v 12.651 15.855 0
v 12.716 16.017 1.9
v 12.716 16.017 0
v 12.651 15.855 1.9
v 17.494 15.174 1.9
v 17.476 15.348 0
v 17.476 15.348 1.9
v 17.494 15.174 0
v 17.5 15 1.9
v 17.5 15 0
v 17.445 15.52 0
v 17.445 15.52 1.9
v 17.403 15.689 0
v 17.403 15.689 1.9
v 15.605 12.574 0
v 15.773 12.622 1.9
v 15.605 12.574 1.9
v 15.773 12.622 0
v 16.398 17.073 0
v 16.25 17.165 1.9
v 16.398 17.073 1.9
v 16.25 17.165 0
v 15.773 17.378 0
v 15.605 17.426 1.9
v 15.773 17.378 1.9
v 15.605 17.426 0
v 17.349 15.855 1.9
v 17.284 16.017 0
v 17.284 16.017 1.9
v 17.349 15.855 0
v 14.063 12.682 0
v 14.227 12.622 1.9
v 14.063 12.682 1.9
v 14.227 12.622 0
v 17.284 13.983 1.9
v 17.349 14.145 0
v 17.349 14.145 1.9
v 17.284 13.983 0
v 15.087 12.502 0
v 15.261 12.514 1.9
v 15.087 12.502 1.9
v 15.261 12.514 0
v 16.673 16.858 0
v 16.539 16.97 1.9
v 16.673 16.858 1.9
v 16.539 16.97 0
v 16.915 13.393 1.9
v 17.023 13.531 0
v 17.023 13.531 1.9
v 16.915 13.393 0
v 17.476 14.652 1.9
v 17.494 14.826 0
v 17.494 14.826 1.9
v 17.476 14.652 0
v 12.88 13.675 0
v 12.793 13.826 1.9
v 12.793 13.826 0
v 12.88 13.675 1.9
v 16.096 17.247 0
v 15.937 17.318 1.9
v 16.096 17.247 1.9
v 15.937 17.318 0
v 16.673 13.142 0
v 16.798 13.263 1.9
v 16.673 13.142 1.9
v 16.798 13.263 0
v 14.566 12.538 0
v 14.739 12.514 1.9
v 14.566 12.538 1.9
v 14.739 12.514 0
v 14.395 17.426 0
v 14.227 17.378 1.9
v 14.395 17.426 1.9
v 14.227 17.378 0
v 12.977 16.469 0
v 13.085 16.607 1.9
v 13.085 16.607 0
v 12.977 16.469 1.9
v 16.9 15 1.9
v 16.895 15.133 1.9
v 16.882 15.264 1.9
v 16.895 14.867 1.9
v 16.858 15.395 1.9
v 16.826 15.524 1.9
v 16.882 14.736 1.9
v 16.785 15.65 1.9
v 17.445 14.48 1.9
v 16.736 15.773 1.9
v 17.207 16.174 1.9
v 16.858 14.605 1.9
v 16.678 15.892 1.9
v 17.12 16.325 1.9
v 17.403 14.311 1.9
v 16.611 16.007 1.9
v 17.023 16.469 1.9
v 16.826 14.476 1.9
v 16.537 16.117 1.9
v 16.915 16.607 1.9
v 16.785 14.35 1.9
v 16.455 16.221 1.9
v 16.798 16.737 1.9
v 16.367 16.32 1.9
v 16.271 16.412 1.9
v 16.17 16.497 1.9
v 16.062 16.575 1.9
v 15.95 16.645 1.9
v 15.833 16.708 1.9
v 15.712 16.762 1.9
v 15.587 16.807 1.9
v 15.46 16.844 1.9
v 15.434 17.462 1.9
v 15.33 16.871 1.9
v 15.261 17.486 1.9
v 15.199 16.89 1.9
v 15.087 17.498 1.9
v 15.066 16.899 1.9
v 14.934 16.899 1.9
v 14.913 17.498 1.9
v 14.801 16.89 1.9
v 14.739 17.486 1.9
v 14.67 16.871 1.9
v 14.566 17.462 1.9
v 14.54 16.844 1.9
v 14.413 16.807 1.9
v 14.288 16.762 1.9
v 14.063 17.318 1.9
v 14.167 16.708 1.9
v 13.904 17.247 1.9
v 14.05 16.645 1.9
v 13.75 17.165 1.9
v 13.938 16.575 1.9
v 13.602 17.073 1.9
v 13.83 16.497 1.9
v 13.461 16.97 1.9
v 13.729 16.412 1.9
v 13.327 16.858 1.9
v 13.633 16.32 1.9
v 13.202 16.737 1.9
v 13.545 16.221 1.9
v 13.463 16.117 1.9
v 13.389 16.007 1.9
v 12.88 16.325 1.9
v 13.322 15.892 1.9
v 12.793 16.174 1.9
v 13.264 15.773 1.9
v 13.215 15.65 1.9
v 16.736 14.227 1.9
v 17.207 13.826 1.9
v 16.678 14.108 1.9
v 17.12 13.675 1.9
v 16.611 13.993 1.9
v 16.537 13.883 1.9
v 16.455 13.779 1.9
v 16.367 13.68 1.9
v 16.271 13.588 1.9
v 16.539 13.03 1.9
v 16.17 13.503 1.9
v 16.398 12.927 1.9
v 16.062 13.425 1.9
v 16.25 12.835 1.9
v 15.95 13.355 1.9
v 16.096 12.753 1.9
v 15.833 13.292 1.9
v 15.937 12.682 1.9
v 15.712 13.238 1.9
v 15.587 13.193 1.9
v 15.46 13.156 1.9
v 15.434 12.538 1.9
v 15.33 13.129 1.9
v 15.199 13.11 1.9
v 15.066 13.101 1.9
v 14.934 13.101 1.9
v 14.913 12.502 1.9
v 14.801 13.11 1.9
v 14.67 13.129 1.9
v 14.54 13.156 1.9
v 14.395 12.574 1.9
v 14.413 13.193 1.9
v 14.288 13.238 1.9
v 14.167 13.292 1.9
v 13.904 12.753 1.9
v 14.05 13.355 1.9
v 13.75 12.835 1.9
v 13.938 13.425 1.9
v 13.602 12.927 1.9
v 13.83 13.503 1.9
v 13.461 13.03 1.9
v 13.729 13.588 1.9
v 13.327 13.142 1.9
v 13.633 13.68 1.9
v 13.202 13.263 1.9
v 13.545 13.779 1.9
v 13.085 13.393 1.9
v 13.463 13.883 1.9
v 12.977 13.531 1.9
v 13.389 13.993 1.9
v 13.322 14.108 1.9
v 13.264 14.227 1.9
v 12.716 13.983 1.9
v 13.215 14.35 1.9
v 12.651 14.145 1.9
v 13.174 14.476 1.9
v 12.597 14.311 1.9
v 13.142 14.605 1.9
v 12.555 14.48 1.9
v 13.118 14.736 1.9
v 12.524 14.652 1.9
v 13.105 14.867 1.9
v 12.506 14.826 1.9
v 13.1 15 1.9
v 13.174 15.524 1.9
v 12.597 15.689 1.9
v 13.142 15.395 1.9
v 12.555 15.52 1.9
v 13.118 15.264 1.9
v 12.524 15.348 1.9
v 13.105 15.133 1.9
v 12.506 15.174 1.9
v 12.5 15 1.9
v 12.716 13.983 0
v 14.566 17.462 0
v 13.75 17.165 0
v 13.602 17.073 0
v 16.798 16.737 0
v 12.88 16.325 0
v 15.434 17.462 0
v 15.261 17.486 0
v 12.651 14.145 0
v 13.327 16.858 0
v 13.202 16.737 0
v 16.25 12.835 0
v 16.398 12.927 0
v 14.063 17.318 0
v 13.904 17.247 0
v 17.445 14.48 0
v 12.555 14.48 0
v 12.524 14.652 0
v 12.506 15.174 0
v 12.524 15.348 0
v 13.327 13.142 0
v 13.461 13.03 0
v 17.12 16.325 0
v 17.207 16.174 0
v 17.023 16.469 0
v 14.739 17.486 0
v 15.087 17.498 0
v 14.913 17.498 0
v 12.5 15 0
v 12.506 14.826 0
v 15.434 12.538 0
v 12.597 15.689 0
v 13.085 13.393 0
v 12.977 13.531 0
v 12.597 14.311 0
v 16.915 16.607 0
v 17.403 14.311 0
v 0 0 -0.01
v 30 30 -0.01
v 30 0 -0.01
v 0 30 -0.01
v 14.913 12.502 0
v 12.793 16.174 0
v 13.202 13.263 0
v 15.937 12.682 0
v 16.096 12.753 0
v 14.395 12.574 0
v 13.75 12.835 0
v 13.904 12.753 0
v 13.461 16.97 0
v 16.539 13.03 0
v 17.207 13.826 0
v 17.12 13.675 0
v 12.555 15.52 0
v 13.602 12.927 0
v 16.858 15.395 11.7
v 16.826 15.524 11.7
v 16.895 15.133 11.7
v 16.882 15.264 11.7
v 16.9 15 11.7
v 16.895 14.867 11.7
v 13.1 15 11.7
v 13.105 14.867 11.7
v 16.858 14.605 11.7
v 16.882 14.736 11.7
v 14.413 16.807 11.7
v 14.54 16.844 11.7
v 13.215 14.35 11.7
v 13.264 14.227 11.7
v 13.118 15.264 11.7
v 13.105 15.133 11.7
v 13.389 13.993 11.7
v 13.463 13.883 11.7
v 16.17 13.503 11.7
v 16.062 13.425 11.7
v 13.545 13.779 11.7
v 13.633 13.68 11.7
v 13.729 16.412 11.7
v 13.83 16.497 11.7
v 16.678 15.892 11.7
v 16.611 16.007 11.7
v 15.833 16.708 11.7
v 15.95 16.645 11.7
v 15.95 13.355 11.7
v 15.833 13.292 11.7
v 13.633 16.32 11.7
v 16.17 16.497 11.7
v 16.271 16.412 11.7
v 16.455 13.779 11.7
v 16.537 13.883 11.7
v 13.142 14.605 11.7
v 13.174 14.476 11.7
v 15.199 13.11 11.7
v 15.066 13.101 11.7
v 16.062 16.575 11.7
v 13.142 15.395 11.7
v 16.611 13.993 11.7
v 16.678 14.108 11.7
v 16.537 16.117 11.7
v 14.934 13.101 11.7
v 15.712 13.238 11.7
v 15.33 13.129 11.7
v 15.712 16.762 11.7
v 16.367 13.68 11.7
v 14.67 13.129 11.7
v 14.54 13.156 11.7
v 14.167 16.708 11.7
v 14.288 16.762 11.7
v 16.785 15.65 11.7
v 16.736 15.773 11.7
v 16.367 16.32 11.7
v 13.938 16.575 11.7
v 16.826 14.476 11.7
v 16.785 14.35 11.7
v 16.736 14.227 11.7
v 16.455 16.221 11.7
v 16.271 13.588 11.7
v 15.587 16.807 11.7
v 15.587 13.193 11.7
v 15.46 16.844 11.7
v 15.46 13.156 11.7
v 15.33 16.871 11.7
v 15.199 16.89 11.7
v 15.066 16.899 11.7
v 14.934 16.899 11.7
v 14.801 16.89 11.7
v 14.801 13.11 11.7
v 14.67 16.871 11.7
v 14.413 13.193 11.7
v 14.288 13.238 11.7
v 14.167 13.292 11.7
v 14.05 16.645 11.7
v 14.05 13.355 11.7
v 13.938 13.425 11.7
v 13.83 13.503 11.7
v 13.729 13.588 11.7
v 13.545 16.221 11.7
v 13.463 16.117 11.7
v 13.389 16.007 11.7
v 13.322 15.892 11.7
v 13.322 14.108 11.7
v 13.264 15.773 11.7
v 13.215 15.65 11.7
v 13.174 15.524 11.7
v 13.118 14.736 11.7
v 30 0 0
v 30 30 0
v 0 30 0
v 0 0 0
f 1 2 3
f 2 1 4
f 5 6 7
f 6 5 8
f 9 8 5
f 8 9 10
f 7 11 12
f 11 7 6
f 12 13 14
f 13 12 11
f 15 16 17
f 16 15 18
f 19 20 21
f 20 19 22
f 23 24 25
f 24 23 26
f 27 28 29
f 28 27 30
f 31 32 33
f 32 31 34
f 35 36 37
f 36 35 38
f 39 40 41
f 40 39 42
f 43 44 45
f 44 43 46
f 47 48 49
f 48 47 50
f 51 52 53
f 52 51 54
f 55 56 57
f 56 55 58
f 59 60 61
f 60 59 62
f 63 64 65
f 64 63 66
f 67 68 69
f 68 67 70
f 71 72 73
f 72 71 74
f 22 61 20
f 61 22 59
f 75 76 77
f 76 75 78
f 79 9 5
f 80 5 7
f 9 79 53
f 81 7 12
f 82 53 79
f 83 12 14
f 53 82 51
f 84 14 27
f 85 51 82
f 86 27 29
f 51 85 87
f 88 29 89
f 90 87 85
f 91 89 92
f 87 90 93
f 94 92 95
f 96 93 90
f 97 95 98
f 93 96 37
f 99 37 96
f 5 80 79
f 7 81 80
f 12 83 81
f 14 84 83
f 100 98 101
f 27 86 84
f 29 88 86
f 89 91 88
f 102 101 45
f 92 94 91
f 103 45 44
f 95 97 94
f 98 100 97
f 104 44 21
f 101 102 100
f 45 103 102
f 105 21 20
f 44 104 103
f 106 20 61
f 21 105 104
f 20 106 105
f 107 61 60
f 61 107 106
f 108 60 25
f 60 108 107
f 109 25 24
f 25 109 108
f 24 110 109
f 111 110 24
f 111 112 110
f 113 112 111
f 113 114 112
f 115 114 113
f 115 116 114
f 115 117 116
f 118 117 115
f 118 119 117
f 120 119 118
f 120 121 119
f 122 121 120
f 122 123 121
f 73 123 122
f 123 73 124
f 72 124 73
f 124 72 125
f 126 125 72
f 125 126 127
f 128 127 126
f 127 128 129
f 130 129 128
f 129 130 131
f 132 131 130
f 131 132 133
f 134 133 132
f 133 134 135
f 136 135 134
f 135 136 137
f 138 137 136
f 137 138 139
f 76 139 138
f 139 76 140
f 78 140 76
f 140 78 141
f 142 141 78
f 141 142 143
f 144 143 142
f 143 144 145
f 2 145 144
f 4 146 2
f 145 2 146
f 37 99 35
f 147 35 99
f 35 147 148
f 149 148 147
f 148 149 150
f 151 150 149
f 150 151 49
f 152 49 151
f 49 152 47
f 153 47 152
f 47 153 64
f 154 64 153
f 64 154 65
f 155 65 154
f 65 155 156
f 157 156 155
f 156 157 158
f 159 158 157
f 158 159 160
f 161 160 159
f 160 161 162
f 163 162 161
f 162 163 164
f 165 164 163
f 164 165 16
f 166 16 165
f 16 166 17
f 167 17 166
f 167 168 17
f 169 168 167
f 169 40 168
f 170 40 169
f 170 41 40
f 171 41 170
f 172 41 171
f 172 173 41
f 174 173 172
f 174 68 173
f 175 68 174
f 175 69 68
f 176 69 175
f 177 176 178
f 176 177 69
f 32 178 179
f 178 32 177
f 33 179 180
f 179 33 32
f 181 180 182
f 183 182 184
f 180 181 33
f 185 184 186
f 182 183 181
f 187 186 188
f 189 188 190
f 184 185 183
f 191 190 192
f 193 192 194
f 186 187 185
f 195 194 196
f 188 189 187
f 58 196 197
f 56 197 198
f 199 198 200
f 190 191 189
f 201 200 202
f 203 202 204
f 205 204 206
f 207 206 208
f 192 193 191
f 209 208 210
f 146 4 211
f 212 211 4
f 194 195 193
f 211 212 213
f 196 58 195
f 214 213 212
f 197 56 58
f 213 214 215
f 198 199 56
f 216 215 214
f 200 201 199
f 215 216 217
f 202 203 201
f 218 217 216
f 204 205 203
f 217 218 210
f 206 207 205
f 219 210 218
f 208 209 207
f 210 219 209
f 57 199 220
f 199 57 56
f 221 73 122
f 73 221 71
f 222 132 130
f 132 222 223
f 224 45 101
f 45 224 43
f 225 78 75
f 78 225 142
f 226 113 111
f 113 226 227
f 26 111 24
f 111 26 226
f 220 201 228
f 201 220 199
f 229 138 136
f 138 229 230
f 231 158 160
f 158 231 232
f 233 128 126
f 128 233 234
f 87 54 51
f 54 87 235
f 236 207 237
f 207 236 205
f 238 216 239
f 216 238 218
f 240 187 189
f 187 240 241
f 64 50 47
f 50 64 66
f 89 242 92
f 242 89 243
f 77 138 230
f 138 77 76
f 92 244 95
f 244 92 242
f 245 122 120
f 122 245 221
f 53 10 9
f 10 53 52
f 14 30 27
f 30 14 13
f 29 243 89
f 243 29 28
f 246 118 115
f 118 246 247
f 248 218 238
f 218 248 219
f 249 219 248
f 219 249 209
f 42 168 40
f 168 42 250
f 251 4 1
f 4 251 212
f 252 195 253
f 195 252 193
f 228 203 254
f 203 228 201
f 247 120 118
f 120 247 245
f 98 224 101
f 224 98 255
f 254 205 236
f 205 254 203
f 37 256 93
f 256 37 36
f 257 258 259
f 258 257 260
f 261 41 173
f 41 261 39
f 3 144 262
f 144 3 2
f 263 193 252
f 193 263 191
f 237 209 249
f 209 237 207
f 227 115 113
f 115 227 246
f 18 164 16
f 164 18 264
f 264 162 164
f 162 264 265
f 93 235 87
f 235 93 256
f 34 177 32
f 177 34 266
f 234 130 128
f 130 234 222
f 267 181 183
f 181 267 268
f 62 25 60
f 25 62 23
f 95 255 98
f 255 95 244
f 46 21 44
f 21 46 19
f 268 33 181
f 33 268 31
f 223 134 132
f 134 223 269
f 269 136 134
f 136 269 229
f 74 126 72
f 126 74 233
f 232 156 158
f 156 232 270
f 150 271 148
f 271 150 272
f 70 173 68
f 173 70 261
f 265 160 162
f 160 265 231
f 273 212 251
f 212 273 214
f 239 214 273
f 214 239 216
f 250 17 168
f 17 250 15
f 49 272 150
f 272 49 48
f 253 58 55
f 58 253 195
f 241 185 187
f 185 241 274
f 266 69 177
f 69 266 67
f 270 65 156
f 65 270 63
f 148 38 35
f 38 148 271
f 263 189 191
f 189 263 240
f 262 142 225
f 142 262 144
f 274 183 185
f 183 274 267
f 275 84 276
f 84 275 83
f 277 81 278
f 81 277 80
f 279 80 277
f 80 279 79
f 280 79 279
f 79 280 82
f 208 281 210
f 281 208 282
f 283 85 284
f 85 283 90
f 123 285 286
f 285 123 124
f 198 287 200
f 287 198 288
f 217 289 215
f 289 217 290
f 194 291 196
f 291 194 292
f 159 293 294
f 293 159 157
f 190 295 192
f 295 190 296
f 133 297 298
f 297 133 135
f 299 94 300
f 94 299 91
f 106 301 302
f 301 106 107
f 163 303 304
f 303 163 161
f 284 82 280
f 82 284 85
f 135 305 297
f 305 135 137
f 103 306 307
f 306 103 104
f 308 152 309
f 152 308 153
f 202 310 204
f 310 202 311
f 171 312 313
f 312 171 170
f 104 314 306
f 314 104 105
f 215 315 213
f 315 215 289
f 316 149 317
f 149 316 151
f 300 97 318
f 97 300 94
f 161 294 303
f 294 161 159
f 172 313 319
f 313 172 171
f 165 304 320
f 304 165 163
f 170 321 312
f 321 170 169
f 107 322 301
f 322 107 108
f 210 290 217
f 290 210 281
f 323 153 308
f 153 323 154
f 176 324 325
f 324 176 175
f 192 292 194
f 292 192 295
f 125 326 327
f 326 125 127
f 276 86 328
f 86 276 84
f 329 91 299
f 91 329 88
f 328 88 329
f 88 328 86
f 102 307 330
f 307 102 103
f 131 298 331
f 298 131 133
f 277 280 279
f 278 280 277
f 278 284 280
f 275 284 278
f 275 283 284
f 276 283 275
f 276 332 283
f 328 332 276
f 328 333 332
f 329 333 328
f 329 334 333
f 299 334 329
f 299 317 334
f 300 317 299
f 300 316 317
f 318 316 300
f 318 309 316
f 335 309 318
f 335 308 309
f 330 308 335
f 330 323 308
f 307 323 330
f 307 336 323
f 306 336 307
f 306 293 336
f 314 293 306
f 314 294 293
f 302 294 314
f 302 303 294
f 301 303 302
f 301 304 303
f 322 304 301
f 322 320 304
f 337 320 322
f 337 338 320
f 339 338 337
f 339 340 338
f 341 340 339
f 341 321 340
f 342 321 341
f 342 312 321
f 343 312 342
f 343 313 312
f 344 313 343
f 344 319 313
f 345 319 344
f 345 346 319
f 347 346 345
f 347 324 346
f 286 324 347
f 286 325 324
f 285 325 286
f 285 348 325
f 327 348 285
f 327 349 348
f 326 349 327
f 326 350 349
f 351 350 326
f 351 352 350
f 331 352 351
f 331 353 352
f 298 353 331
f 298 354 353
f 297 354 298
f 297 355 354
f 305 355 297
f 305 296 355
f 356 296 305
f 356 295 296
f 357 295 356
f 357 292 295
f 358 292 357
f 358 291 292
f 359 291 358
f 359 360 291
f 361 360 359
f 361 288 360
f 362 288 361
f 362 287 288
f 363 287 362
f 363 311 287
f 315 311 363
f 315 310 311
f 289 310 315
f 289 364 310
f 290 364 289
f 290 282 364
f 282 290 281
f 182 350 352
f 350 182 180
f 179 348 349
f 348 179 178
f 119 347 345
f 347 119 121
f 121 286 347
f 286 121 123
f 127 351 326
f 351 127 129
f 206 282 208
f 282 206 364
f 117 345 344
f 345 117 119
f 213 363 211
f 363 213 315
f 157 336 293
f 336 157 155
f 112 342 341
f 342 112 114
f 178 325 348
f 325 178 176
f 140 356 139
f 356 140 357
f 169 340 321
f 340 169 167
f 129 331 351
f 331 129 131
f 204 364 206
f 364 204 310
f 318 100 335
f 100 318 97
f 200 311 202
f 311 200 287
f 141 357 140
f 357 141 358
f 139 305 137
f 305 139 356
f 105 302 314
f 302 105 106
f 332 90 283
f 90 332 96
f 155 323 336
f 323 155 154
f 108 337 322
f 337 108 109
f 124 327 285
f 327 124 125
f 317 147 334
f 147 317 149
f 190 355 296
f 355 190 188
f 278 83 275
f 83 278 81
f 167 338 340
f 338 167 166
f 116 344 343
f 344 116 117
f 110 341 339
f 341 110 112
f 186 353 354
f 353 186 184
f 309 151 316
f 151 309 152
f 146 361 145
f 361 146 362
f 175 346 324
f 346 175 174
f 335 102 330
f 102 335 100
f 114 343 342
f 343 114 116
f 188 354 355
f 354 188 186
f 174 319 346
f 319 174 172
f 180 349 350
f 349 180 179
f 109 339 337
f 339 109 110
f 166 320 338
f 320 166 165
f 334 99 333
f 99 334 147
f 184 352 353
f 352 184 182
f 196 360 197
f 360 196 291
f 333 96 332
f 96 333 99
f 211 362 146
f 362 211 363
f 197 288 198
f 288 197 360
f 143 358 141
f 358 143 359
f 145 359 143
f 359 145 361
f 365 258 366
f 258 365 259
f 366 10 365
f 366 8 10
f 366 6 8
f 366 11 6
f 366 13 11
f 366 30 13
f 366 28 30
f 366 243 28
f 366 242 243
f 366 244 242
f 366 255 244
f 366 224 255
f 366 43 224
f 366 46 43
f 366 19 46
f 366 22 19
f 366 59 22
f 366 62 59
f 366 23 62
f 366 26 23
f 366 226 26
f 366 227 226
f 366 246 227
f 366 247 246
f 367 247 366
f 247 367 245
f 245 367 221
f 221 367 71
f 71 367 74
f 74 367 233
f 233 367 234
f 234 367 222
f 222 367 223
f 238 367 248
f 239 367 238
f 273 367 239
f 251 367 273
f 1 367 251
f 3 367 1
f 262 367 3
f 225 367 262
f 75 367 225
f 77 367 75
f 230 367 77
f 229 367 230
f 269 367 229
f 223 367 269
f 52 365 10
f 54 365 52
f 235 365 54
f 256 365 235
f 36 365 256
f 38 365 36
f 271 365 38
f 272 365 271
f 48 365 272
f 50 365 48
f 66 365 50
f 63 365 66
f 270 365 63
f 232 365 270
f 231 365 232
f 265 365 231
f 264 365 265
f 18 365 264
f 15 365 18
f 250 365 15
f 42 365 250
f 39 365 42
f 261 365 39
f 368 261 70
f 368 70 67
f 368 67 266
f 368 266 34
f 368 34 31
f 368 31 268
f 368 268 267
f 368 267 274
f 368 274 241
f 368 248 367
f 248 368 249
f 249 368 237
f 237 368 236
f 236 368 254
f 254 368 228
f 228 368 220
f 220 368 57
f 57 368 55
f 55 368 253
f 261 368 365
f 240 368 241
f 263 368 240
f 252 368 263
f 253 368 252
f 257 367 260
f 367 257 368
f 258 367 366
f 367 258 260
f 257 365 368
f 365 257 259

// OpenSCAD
// file: ../Base/Rotation.scad
// Fischertechnik Box Foundation
// Geometry Helpers Rotation

include <PlacementOptions.scad>

// getRotatedSpace(space, rotation=NoRotation)
// Rotates the space dependent on the specified rotation

function getRotatedSpace(space, rotation=NoRotation) = [
    (rotation == Rotate90 || rotation == Rotate270) ? space.y : space.x,
    (rotation == Rotate90 || rotation == Rotate270) ? space.x : space.y
];

// Rotates the given space around the fixed left lower corner
// space = the space the children needs as width/depth list [width,depth]
// rotation = 0 Rotate0 degrees, 1 Rotate90 degrees, 2 Rotate180 degrees, 3 Rotate270 degrees (equivalent to -90)

module RotateFix(space, rotation=NoRotation) {
    dy = (rotation == Rotate0 || rotation == Rotate270) ? 0 :
        (rotation == Rotate90) ? space.x :
        space.y;
    dx = (rotation < Rotate180) ? 0 :
        (rotation == Rotate180) ? space.x :
        space.y;
    
    translate([dx, dy, 0])
        rotate([0, 0, rotations[rotation]])
            children();
}
// file: ../Base/Alignment.scad
// Fischertechnik Box Foundation
// Geometry Helpers Alignment

include <PlacementOptions.scad>

// getAlignedX(elementWidth, spaceWidth, align=AlignRight, offset=0)
// Gets the aligned X offset of an element with the given
// width in the given space.
// elementWidth = The width of the element to positon
// spaceWidth = The space where the element should be aligned
// align = 0 AlignLeft, 1 AlignCenter, 2 AlignRight
// offset = an optional offset from the aligned position. When
// aligned left or centered, then positive values are in X direction.
// When aligned right then positive values are in negative X direction.

function getAlignedX(elementWidth, spaceWidth, align=AlignRight, offset=0) =
    (align == AlignLeft) ?
        offset :
        ((align == AlignCenter) ?
        (spaceWidth - elementWidth)/2 + offset :
        spaceWidth - offset - elementWidth);

// getAlignedY(elementDepth, spaceDepth, align=AlignTop, offset=0)
// Gets the aligned Y offset of an element with the given
// depth in the given space.
// elementDepth = The depth of the element to positon
// spaceDepth = The space where the element should be aligned
// align = 0 AlignBottom, 1 AlignCenter, 2 AlignTop
// offset = an optional offset from the aligned position. When
// aligned bottom or centered, then positive values are in Y direction.
// When aligned top then positive values are in negative Y direction.

function getAlignedY(elementDepth, spaceDepth, align=AlignTop, offset=0) =
    (align == AlignBottom) ?
        offset :
        ((align == AlignCenter) ?
        (spaceDepth - elementDepth)/2 + offset :
        spaceDepth - offset - elementDepth);
// file: ../Base/PlacementOptions.scad
// Fischertechnik Box Foundation
// Placement Options

// Alignment
NoAlign = 0;
AlignLeft = 1;
AlignBottom = 2;
AlignCenter = 3;
AlignRight = 4;
AlignTop = 5;

// Element rotation degree steps
rotations = [0, -90, -180, -270];

// Rotation
NoRotation = 0;
Rotate0 = 0;
Rotate90 = 1;
Rotate180 = 2;
Rotate270 = 3;

// Docking (seen from above)
NoDock = -1;
DockLeft = 0;
DockTop = 1;
DockRight = 2;
DockCorner = 2;
DockBottom = 3;

// Web corners
LowerLeft = 0;
UpperLeft = 1;
UpperRight = 2;
LowerRight = 3;

// Web position relative to corner
LeftOfCorner = 0;
RightOfCorner = 1;
// file: ../Base/Boxes.scad
// Fischertechnik Box Foundation
// Pre-designed Boxes

use <Constants.scad>

include <PlacementOptions.scad>

box190Width = 190;
box190Depth = 130;
box130Width = 130;
box130Depth = 95;

// Values are from an original ec3 box
topBottomDifference = 1.5;
outerHeight = 40;
innerHeight = 38.2;
baseThickness = outerHeight - innerHeight;
stackExcess = 5.7;
radius = 3.5;
wallThickness = 1.5;
tolerance = 0.2;
stackOffset = innerHeight - stackExcess;

boxUsageHeight = stackOffset;
boxWallThickness = wallThickness;
boxBaseThickness = baseThickness;
boxWebWidth = 3.0;

// getBoxWallThickness()
// Gets the wall thickness of a Fischertechnik Box
function getBoxWallThickness() = boxWallThickness;

// getBoxUsageHeight()
// Gets the usable height of a Fischertechnik box
function getBoxUsageHeight() = boxUsageHeight;

// getBoxInnerHeight()
// Gets the inner height of a Fischertechnik box, including the stack excess
function getBoxInnerHeight() = innerHeight;

// getBoxBaseThickness()
// Gets the thickness of the Fischertechnik box base.
function getBoxBaseThickness() = boxBaseThickness;

// getBoxWebWidth()
// Gets the width of a box web
function getBoxWebWidth() = boxWebWidth;

// getBox190Space()
// Gets the usable inner space of a Box 190 as an x/y-list
function getBox190Space() = [
    box190Width - 2*getBoxWallThickness() - topBottomDifference, 
    box190Depth - 2*getBoxWallThickness() - topBottomDifference ];

// BoxBase(width, depth)
// Creates an empty stackable Fischertechnik compatible box
// width = Outer width of the box (190, 130, ...)
// depth = Outer depth of the box (130, 95, ...)

module BoxBase(width, depth, height=outerHeight) {    
    thinPlate = 0.01;

    innerHeight = height - baseThickness;    
    
    module BodyPlate(width, depth) {
        translate([radius, radius])
        hull() {
            w = width-2*radius;
            d = depth-2*radius;
            cube([w, d, thinPlate]);
            cylinder(thinPlate, r=radius, $fn=getFragments());
            translate([w, 0])
                cylinder(thinPlate, r=radius, $fn=getFragments());
            translate([w, d])
                cylinder(thinPlate, r=radius, $fn=getFragments());
            translate([0, d])
                cylinder(thinPlate, r=radius, $fn=getFragments());
        }
    }
    
    module Body(tolerance=tolerance) {
        hull() {
            // Bottom with tolerance to fit into the original boxes when stacked
            translate([-wallThickness+tolerance, -wallThickness+tolerance, -baseThickness])
                BodyPlate(width-topBottomDifference-2*tolerance, depth-topBottomDifference-2*tolerance);
            
            // Top
            translate([-wallThickness-topBottomDifference/2, -wallThickness-topBottomDifference/2, innerHeight-thinPlate])
                BodyPlate(width, depth);
         }
    }

    module Cutoff() {
        hull() {
            coWidth = width - 2*wallThickness;
            coDepth = depth - 2*wallThickness;
            
            // Bottom
            BodyPlate(coWidth-topBottomDifference, coDepth-topBottomDifference);

            // Top
            translate([-topBottomDifference/2, -topBottomDifference/2, innerHeight+thinPlate]) 
                BodyPlate(coWidth, coDepth);
        }
    }
    
    difference() {        
        Body();
        Cutoff();
        stackOffset = innerHeight - stackExcess;
        translate([0, 0, stackOffset + baseThickness])
            Body(tolerance=0);
    }
}

// Creates the Fischertechnik empty box 130x190 mm and places it at position 0,0
// 190x130 are the outer sizes, the inner space is slightly smaller. Use getBox190Space() to get the inner sizes.
// The box is positioned that the usable inner space is at the 0,0,0 position. The

module Box190() {
    BoxBase(box190Width, box190Depth);
}

// Gets the usable inner space of a Box 130 as an x/y-list
function getBox130Space() = [
    box130Width - 2*getBoxWallThickness() - topBottomDifference, 
    box130Depth - 2*getBoxWallThickness() - topBottomDifference ];

// Creates the Fischertechnik empty box 95x130 mm and places it at position 0,0
// 190x130 are the outer sizes, the inner space is slightly smaller. Use getBox190Space() to get the inner sizes.
// The box is positioned that the usable inner space is at the 0,0,0 position. The

module Box130() {
    BoxBase(box130Width, box130Depth);
}

// Creates a web at the specified box walls
// corner 0 = LowerLeft, 1 = UpperLeft, 2 = UpperRight, 3 = LowerRight
// side 0 = LeftOfCorner, 1 = RightOfCorner
// distance = Distance in mm from the corner
// boxSpace = inner width and depth of the box (default: Box 190)
// webWidth = length of the web (default is 3 mms)
// webThickness = thickness of the web (default is 1 mm)

module BoxWeb(corner, side, distance, boxSpace=getBox190Space(), webWidth=getBoxWebWidth(), webThickness=1.0) {
    sink = getBoxWallThickness()/2;

    width = (corner % 2 == 0) ? 
            (side == LeftOfCorner ? webWidth : webThickness) :
            (side == LeftOfCorner ? webThickness : webWidth);

    depth = (corner % 2 == 0) ? 
            (side == RightOfCorner ? webWidth : webThickness) :
            (side == RightOfCorner ? webThickness : webWidth);
    
    xDiff = corner == LowerLeft ? 
                (side == LeftOfCorner ? -sink : distance) :
            (corner == UpperLeft ?                
                (side == LeftOfCorner ? distance : -sink) :
            (corner == UpperRight ?
                (side == LeftOfCorner ? boxSpace.x-webWidth+sink : boxSpace.x-distance-webThickness) :
                (side == LeftOfCorner ? boxSpace.x-distance-webThickness: boxSpace.x-webWidth+sink)));

    yDiff = corner == LowerLeft ? 
                (side == RightOfCorner ? -sink : distance) :
            (corner == UpperLeft ?
                (side == RightOfCorner ? boxSpace.y-distance : boxSpace.y-webWidth+sink) :
            (corner == UpperRight ?
                (side == RightOfCorner ? boxSpace.y-webWidth+sink : boxSpace.y-distance) :
                (side == RightOfCorner ? distance : -sink)));
    
    translate([xDiff, yDiff, -getExcess()])
        cube([width, depth, boxUsageHeight + 2*getExcess()]);
}
// file: ../Base/Placement.scad
// Fischertechnik Box Foundation
// Geometry Helpers Placement

use <Constants.scad>
use <Alignment.scad>
use <Rotation.scad>
use <Boxes.scad>

include <PlacementOptions.scad>

// Place(x=0, y=0, elementSpace=[0,0], alignX=AlignLeft, alignY=AlignBottom, rotation=Rotate0, boxSpace=getBox190Space())
// Places the child at the specified position
// y = Y-Position. This is a relative position when an X aligment is specified.
// x = X-Position. This is a relative position when an Y aligment is specified.
// elementSpace = space of the element to be placed [x,y]
// alignX = -1=NoAlign, 0 AlignLeft, 1 AlignCenter, 3 AlignRight (elementSpace and boxSpace required!)
// alignY = -1=NoAlign, 2 AlignBottom, 1 AlignCenter, 4 AlignTop (elementSpace and boxSpace required!)
// rotation = 0 Rotate0 0 degrees, 1 Rotate90 90 degrees, 
// 2 Rotate180 180 degrees, 3 Rotate270 270 degrees (equivalent to -90)
// boxSpace = Inner space of the box where the placement occurs [x,y] - default is Box 190x130 inner space

module Place(x=0, y=0, elementSpace=[0,0], 
  alignX=AlignLeft, alignY=AlignBottom, 
  rotation=NoRotation, boxSpace=getBox190Space()) {

    module Position(x, y, space, rotation=Rotate0) {
        translate([x, y, 0])
            RotateFix(space, rotation)
                children();
    }

    space = getRotatedSpace(elementSpace, rotation);
    alignedX = getAlignedX(space.x, boxSpace.x, alignX, x);
    alignedY = getAlignedY(space.y, boxSpace.y, alignY, y);
    Position(alignedX, alignedY, elementSpace, rotation)
        children();
}

// Center(space=getBox130Space(), elementSpace=[0,0])
// space = Space where the children is centered. For cylinder use centered=true and no elementSpace.
// elementSpace = space of the element to be centered [x,y]

module Center(space=getBox190Space(), elementSpace=[0,0]) {
    Place(elementSpace=elementSpace, boxSpace=space, alignX=AlignCenter, alignY=AlignCenter)
        children();
}

// CenterHorizontal(width=0, y=0, offset=0, space=getBox130Space())
// width = Width of the element to be placed.
// y = Y position of the element
// offset = Offset from the center position (negative will be left of the center)
// space = Space where the element is placed

module CenterHorizontal(width=0, y=0, offset=0, space=getBox190Space()) {
    Place(x=offset, y=y, elementSpace=[width, 0], boxSpace=space, alignX=AlignCenter)
        children(0);
}

// CenterVertical(depth=0, x=0, offset=0, space=getBox130Space())
// depth = Depth of the element to be placed.
// x = X position of the element
// offset = Offset from the center position (negative will be down of the center)
// space = Space where the element is placed

module CenterVertical(depth=0, x=0, offset=0, space=getBox190Space()) {
    Place(x=x, y=offset, elementSpace=[0, depth], boxSpace=space, alignY=AlignCenter)
        children(0);
}

// getIsVertical(align)
// True if the specified alignment needs a vertical orientation for a divider (AlignRight, AlignLeft)

function getIsVertical(align) = (align == AlignRight || align == AlignLeft);

// getIsHorizontal(align)
// True if the specified alignment needs a horizontal orientation for a divider (AlignTop, AlignBottom)

function getIsHorizontal(align) = (align == AlignTop || align == AlignBottom);
// file: ../Base/Constants.scad
// Fischertechnik Box Foundation
// Constants

// Constant values necessary for multiple elements

// Base constants
dividerThickness = 1.2;
excess = 0.01;
fragments = 90;
tolerance = 0.8;

// Gets the thickness of a divider 
function getDividerThickness() = dividerThickness;

// Gets the excess that is used to merge walls into each other
function getExcess() = excess;

// Gets amount of fragments of a cylinder
function getFragments() = fragments;

// Gets the inner tolerance of a frame to each side
function getTolerance() = tolerance;


// Fischertechnik specific constants
axisDiameter = 4;
axisBottomDiameter = axisDiameter + 1;
standardEdgeDistance = 2.5;
standardWebDistance = 11.5;
standardCornerLength = 15;
tubeWallFactor = 0.8;
smallPartsFrameHeight = 20;

// Gets axis diameter
function getAxisDiameter() = axisDiameter;

// Gets axis bottom diameter for thicker part at the bottom
function getAxisBottomDiameter() = axisBottomDiameter;

// gets the standard distance to the wall of the box for dockable frames with webs
function getStandardEdgeDistance() = standardEdgeDistance;

// gets the standard distance of each web to the corner of the dockable frame
function getStandardWebDistance() = standardWebDistance;

// gets the standard length of the corner walls of a dockable frame
function getStandardCornerLength() = standardCornerLength;

// gets the wall thickness of a tube.
function getTubeWallThickness() = tubeWallFactor * getDividerThickness();

// gets the frame height for docked small parts boxes.
function getSmallPartsFrameHeight() = smallPartsFrameHeight;
// main file
// Fischertechnik Box Library
// Axis for flat hub
// 31015
// 3D print tested

use <../Base/Constants.scad>
use <../ModelBase/Simple.scad>

width = 30;
depth = 30;

// getAxisFlatHubSpace()
// Gets the space the axis flat hub needs as width and depth (.x and .y as a list)

function getAxisFlatHubSpace() = [width, depth];

// AxisFlatHub()
// Standing axis for flat hub.

module AxisFlatHub() {
    height = 11.7;
    levelHeight = 1.9;
    correctedDiameter = getAxisDiameter() - 0.2;    // 3D print correction
    LeveledAxisWithSpace(height, levelHeight, getAxisFlatHubSpace(), diameter = correctedDiameter);
}

// Tests
color("lightgray")
AxisFlatHub();
